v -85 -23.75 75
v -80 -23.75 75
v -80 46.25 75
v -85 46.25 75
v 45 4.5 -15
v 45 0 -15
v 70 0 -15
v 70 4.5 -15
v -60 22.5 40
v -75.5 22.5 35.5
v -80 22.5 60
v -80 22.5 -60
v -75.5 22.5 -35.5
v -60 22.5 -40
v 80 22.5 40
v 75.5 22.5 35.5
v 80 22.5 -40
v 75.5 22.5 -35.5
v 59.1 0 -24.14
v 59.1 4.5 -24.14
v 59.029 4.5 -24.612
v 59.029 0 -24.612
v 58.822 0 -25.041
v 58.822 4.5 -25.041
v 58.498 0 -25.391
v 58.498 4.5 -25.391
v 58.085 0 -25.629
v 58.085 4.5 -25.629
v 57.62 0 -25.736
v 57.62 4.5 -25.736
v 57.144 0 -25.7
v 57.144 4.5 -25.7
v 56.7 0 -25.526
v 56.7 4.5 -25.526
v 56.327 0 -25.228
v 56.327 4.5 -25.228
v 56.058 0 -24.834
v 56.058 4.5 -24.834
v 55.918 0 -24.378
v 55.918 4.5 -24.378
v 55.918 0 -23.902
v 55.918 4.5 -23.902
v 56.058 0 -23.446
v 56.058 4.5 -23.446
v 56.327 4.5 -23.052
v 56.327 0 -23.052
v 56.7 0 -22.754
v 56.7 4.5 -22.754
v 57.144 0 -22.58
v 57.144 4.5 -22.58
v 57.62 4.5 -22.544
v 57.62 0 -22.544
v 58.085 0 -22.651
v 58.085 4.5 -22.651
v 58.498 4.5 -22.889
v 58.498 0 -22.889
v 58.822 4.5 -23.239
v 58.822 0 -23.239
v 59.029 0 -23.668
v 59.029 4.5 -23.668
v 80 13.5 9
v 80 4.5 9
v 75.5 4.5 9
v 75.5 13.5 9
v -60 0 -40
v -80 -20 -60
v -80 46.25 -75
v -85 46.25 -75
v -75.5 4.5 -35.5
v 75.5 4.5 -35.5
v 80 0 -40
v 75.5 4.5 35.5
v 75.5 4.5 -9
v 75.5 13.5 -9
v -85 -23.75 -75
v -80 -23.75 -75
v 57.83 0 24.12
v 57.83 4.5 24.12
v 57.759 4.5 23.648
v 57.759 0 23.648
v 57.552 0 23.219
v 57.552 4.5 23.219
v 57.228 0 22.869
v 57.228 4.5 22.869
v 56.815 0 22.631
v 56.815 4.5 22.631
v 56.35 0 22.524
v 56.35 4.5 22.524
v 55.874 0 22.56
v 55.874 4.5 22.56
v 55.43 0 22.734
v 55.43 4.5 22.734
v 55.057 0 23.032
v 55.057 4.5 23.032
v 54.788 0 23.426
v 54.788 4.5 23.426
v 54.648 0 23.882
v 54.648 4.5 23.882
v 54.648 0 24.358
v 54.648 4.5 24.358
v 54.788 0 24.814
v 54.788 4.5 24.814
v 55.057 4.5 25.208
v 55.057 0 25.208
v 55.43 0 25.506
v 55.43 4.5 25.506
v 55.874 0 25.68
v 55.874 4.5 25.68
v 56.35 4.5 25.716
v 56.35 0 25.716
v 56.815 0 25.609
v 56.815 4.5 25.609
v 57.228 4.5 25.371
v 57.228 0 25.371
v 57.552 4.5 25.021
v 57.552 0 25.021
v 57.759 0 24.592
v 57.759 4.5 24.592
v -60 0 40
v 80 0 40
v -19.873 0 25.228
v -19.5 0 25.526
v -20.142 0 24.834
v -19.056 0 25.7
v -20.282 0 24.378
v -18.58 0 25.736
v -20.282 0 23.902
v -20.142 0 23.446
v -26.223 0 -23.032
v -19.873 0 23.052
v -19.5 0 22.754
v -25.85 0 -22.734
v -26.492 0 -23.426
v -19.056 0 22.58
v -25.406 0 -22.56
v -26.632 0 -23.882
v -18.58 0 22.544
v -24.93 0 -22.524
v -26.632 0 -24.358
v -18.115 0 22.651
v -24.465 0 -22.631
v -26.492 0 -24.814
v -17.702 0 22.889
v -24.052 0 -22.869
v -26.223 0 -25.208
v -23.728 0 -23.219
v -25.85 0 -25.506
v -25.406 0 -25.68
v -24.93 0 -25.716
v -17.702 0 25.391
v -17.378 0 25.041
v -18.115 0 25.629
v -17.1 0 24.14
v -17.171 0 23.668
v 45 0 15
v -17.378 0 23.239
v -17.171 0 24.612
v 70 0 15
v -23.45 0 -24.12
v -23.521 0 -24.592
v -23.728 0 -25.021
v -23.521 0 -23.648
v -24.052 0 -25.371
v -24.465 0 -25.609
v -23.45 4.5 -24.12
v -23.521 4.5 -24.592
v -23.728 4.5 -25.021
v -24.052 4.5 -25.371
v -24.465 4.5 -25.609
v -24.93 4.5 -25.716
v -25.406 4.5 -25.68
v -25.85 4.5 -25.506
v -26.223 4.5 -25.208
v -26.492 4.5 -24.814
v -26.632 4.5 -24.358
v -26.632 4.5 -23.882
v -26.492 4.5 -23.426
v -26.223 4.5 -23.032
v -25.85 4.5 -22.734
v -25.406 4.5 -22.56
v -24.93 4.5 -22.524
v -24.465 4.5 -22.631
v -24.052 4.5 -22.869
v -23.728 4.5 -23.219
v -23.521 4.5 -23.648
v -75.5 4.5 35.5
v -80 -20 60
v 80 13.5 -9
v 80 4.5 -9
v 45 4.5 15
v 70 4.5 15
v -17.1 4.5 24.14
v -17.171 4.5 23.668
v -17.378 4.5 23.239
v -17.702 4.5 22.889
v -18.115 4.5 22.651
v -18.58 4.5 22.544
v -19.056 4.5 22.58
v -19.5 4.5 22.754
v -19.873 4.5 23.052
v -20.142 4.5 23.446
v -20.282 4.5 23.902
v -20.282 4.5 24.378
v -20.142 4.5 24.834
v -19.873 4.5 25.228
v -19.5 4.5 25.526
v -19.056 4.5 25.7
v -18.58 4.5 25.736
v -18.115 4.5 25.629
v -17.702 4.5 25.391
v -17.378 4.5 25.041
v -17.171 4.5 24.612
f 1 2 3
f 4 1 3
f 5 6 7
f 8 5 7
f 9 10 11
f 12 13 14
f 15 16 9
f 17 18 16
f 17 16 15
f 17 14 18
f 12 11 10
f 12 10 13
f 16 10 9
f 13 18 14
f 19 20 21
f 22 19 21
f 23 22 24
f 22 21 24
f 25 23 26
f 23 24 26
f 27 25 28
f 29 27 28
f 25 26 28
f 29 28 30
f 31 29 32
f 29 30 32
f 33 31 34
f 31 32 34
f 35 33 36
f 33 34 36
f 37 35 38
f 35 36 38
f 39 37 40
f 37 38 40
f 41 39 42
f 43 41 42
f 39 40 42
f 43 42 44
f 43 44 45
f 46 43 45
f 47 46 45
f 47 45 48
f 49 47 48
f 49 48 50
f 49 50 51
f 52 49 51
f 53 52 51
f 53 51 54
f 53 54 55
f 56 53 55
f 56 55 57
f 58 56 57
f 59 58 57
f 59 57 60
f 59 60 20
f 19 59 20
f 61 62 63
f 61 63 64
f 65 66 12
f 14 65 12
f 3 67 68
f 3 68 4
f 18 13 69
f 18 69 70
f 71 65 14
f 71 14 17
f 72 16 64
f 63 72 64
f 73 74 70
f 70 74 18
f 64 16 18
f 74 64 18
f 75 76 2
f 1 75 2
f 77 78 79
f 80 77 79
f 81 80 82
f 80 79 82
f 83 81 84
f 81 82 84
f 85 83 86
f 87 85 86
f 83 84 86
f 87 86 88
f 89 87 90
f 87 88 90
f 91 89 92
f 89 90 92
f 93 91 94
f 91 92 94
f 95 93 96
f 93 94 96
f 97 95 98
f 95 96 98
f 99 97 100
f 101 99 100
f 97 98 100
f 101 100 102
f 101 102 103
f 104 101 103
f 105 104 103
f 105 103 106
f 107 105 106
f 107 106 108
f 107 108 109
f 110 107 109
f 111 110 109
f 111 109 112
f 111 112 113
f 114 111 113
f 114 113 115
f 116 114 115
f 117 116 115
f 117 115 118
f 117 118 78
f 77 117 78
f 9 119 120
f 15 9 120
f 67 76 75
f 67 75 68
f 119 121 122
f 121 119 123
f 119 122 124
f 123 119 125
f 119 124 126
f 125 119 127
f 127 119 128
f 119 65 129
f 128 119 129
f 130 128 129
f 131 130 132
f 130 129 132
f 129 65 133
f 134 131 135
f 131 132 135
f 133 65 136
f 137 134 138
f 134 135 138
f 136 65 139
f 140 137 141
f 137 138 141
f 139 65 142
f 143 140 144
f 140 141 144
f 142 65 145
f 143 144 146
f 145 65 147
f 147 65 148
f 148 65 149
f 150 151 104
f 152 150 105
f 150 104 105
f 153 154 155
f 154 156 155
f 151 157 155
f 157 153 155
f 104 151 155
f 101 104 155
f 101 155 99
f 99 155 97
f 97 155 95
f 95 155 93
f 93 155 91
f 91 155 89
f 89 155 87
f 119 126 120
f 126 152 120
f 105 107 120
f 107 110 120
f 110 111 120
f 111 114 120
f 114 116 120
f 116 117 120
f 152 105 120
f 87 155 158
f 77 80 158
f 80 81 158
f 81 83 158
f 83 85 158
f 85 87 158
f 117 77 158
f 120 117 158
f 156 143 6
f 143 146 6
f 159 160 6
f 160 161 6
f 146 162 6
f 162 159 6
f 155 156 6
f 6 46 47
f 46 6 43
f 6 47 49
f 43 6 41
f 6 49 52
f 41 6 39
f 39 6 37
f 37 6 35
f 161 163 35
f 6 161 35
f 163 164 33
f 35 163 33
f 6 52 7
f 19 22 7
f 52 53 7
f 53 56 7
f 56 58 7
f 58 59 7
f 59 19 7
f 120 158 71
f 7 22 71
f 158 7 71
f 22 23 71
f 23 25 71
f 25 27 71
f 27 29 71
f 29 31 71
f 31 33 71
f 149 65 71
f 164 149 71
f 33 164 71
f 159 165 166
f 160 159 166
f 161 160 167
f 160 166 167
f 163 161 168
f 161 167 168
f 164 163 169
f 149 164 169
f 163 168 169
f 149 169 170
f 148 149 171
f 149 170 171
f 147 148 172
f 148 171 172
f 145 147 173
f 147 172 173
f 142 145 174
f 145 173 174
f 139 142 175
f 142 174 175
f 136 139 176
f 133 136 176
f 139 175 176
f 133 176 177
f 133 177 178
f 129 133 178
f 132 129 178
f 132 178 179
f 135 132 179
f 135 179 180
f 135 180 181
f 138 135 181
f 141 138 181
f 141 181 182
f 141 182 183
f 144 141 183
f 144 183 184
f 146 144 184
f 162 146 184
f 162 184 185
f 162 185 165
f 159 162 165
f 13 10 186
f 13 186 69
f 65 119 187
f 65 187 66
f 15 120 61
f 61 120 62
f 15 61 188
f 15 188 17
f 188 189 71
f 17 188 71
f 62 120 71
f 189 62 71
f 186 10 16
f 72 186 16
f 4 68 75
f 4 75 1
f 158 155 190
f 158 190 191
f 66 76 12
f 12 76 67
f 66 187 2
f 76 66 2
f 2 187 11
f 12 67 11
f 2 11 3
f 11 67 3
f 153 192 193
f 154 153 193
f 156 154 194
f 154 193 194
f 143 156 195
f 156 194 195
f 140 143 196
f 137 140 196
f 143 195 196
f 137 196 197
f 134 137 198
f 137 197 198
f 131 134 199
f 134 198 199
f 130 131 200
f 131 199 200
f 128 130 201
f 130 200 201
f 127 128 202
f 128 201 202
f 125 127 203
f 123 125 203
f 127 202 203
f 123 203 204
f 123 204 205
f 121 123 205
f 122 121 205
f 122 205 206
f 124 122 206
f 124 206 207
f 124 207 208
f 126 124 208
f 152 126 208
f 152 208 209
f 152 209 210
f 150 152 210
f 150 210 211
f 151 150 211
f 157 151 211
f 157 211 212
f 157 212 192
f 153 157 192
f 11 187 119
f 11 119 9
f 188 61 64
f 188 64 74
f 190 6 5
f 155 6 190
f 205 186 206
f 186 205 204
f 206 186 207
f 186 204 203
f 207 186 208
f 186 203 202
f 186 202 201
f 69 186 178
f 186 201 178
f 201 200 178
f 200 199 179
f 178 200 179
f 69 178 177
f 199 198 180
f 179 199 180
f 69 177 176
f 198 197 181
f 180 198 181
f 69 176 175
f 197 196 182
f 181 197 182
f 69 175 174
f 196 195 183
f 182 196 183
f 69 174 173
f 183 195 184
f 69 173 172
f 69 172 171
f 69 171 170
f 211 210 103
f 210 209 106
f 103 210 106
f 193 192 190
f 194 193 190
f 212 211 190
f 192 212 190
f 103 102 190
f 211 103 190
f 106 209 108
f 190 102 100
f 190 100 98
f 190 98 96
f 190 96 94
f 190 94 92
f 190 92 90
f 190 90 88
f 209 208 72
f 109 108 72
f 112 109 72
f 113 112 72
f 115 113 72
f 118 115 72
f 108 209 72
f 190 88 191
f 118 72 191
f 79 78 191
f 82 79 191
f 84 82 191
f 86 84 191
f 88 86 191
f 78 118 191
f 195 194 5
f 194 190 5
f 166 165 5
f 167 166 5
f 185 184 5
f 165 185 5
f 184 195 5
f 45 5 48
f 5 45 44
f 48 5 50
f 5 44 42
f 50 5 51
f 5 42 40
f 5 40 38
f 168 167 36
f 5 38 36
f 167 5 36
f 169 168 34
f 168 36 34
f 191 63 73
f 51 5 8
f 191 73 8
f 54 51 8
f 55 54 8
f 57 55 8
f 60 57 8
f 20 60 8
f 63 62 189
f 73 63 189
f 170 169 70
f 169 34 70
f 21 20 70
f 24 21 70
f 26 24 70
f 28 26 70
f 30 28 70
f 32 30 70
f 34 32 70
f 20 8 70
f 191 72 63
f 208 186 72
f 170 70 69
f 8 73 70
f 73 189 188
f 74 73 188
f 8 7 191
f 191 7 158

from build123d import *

# Parameters (mm, degrees)
SKETCH1_W           = 160
SKETCH1_H           = 80
BOSS_EXTRUDE1_DEPTH = 22.5
SKETCH2_W           = 151
SKETCH2_H           = 71
CUT_EXTRUDE1_DEPTH  = 18
SKETCH3_W           = 150
SKETCH3_H           = 70
BOSS_EXTRUDE2_DEPTH = 5
SKETCH4_W           = 18
SKETCH4_H           = 9
CUT_EXTRUDE3_DEPTH  = 13
SKETCH6_R           = 1.6
CUT_EXTRUDE5_DEPTH  = 13
SKETCH5_W           = 25
SKETCH5_H           = 30
CUT_EXTRUDE6_DEPTH  = 13
CHAMFER3_SIZE       = 20


with BuildPart() as part:
    # Sketch1 → Boss-Extrude1 (new body)
    with BuildSketch(Plane(origin=(0, 0, 0), x_dir=(1, 0, 0), z_dir=(0, 1, 0))):
        Rectangle(SKETCH1_W, SKETCH1_H)
    extrude(amount=BOSS_EXTRUDE1_DEPTH)

    # Sketch2 → Cut-Extrude1 (cut)
    with BuildSketch(Plane(origin=(0, 22.5, 0), x_dir=(1, 0, 0), z_dir=(0, 1, 0))):
        Rectangle(SKETCH2_W, SKETCH2_H)
    extrude(amount=-CUT_EXTRUDE1_DEPTH, mode=Mode.SUBTRACT)

    # Sketch3 → Boss-Extrude2 (add)
    with BuildSketch(Plane.ZY.offset(80)):
        with Locations((0, 11.25)):
            Rectangle(SKETCH3_W, SKETCH3_H)
    extrude(amount=BOSS_EXTRUDE2_DEPTH)

    # Sketch4 → Cut-Extrude3 (cut)
    with BuildSketch(Plane(origin=(80, 0, 0), x_dir=(0, 0, -1), z_dir=(1, 0, 0))):
        with Locations((0, 9)):
            Rectangle(SKETCH4_W, SKETCH4_H)
    extrude(amount=-CUT_EXTRUDE3_DEPTH, mode=Mode.SUBTRACT)

    # Sketch6 → Cut-Extrude5 (cut)
    with BuildSketch(Plane(origin=(0, 4.5, 0), x_dir=(1, 0, 0), z_dir=(0, 1, 0))):
        with Locations((57.5, 24.14)):
            Circle(SKETCH6_R)
        with Locations((56.23, -24.12)):
            Circle(SKETCH6_R)
        with Locations((-18.7, -24.14)):
            Circle(SKETCH6_R)
        with Locations((-25.05, 24.12)):
            Circle(SKETCH6_R)
    extrude(amount=-CUT_EXTRUDE5_DEPTH, mode=Mode.SUBTRACT)

    # Sketch5 → Cut-Extrude6 (cut)
    with BuildSketch(Plane.XZ):
        with Locations((57.5, 0)):
            Rectangle(SKETCH5_W, SKETCH5_H)
    extrude(amount=-CUT_EXTRUDE6_DEPTH, mode=Mode.SUBTRACT)

    # Chamfer3
    chamfer3_edges = [part.edges().sort_by_distance(p)[0] for p in [
        (-80, 0, 0),
        (-80, 11.25, 40),
        (-80, 11.25, -40),
    ]]
    chamfer(chamfer3_edges, length=CHAMFER3_SIZE)


solid = part.part
